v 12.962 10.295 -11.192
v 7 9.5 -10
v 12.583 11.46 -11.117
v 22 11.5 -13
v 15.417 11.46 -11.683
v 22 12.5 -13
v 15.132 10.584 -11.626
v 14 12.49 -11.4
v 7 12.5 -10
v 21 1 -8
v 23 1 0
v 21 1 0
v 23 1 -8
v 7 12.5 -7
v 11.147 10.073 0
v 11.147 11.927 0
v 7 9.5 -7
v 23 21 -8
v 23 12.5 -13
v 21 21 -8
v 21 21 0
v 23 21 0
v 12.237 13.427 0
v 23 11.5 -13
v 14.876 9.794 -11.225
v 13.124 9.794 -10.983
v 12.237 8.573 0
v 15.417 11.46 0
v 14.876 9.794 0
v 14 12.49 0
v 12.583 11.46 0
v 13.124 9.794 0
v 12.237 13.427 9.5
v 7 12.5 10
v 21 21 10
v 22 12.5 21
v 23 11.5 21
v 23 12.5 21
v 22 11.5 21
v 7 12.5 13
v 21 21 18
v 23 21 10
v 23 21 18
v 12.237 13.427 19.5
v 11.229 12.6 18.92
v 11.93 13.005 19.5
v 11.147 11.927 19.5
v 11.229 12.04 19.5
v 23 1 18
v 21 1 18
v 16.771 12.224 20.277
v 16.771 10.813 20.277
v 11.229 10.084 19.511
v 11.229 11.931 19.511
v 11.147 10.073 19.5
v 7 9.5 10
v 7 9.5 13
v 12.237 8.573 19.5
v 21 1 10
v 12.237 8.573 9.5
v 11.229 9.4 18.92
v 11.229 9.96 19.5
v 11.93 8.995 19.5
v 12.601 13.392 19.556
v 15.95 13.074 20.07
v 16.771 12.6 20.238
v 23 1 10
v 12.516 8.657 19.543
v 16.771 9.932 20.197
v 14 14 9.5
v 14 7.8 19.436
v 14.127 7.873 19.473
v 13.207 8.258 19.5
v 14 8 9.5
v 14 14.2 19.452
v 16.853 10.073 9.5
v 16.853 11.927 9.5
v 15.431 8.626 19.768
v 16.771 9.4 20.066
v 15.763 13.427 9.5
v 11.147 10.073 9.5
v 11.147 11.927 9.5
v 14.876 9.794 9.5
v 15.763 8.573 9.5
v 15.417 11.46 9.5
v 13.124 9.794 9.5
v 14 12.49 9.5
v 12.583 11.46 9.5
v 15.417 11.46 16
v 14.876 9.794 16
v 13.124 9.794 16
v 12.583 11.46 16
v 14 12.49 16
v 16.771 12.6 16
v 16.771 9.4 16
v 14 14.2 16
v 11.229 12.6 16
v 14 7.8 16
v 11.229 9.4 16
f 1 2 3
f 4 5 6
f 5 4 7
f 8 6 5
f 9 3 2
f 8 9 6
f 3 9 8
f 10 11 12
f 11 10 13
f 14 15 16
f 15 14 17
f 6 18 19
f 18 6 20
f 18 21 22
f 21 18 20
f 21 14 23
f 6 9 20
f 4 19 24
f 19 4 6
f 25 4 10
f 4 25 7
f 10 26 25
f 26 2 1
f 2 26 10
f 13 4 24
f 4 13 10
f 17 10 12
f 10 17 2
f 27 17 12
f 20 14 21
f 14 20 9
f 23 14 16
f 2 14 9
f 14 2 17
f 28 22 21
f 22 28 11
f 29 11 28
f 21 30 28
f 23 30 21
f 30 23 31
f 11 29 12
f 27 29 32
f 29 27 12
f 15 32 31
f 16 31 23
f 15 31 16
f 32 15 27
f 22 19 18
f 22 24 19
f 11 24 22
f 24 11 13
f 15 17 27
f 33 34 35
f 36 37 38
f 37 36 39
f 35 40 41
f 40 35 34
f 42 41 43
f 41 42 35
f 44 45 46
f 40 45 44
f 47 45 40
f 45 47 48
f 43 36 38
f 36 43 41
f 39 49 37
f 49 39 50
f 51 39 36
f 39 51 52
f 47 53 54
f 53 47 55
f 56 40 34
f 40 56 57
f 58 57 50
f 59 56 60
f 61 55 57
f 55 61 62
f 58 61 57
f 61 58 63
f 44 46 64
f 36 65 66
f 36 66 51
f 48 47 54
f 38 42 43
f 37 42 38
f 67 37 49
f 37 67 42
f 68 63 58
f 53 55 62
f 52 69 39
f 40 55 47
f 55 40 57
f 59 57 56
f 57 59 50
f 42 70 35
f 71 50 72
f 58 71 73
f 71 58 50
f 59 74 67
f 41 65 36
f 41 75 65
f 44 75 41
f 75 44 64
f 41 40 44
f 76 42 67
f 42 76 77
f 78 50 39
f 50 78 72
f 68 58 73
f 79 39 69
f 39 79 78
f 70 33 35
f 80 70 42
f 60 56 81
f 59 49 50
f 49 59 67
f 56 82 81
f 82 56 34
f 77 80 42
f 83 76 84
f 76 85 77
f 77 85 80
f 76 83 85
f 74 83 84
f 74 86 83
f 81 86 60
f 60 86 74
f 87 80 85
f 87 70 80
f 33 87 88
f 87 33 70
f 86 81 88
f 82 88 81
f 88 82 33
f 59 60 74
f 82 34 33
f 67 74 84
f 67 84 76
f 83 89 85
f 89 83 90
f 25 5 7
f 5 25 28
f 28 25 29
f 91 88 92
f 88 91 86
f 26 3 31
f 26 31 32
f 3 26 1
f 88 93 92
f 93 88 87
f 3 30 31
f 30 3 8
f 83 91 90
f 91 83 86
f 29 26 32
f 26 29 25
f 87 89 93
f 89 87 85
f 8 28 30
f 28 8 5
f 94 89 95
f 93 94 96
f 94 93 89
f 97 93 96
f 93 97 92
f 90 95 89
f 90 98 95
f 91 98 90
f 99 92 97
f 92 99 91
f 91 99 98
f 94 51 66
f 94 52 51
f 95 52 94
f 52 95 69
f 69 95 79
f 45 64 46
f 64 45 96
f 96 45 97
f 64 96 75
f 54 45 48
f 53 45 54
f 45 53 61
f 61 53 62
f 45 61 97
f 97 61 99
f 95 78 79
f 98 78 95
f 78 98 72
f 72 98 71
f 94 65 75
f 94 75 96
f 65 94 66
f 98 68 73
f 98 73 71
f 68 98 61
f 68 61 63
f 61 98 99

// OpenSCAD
use <MCAD/nuts_and_bolts.scad>;

module pulley_wall(xside)
{
    hull(){
       translate([0,0,0]) cube([20,8,2]);
       
       if (xside==0){
          translate([8.5,0,14]) cube([3,3,2]);
          translate([8.5,10,0]) cube([1,1,1]);
          translate([10,9.5,9]) rotate([90,0,0]) cylinder(r=3,h=10);
          
         } else {
          translate([8.5,-2,14]) cube([3,3,2]);
          translate([8.5,-5,0]) cube([1,1,1]);
          translate([10,8,9]) rotate([90,0,0]) cylinder(r=3,h=10);
         }
       }
    
}

module pulley_body()
{
    translate([0,4,0])   pulley_wall(1);
    translate([0,22,0])  pulley_wall(0);
    %translate([10,2.2,9]) rotate([90,0,180]) boltHole(3,length=45);
    %translate([10,27,9]) rotate([90,0,180]) nutHole(3); 
}

module pulley_cuts()
{
    translate([10,-2,9]) rotate([90,0,180]) boltHole(3,length=45);
    translate([10,28,9]) rotate([90,0,180]) nutHole(3);  
    translate([10,30,9]) rotate([90,0,180]) nutHole(3); 
}

module pulley()
{
	difference(){
        translate([23,21,-12]) rotate([90,0,270]) pulley_body();
        translate([23,21,-12]) rotate([90,0,270]) pulley_cuts();
        }
    

}



pulley();
